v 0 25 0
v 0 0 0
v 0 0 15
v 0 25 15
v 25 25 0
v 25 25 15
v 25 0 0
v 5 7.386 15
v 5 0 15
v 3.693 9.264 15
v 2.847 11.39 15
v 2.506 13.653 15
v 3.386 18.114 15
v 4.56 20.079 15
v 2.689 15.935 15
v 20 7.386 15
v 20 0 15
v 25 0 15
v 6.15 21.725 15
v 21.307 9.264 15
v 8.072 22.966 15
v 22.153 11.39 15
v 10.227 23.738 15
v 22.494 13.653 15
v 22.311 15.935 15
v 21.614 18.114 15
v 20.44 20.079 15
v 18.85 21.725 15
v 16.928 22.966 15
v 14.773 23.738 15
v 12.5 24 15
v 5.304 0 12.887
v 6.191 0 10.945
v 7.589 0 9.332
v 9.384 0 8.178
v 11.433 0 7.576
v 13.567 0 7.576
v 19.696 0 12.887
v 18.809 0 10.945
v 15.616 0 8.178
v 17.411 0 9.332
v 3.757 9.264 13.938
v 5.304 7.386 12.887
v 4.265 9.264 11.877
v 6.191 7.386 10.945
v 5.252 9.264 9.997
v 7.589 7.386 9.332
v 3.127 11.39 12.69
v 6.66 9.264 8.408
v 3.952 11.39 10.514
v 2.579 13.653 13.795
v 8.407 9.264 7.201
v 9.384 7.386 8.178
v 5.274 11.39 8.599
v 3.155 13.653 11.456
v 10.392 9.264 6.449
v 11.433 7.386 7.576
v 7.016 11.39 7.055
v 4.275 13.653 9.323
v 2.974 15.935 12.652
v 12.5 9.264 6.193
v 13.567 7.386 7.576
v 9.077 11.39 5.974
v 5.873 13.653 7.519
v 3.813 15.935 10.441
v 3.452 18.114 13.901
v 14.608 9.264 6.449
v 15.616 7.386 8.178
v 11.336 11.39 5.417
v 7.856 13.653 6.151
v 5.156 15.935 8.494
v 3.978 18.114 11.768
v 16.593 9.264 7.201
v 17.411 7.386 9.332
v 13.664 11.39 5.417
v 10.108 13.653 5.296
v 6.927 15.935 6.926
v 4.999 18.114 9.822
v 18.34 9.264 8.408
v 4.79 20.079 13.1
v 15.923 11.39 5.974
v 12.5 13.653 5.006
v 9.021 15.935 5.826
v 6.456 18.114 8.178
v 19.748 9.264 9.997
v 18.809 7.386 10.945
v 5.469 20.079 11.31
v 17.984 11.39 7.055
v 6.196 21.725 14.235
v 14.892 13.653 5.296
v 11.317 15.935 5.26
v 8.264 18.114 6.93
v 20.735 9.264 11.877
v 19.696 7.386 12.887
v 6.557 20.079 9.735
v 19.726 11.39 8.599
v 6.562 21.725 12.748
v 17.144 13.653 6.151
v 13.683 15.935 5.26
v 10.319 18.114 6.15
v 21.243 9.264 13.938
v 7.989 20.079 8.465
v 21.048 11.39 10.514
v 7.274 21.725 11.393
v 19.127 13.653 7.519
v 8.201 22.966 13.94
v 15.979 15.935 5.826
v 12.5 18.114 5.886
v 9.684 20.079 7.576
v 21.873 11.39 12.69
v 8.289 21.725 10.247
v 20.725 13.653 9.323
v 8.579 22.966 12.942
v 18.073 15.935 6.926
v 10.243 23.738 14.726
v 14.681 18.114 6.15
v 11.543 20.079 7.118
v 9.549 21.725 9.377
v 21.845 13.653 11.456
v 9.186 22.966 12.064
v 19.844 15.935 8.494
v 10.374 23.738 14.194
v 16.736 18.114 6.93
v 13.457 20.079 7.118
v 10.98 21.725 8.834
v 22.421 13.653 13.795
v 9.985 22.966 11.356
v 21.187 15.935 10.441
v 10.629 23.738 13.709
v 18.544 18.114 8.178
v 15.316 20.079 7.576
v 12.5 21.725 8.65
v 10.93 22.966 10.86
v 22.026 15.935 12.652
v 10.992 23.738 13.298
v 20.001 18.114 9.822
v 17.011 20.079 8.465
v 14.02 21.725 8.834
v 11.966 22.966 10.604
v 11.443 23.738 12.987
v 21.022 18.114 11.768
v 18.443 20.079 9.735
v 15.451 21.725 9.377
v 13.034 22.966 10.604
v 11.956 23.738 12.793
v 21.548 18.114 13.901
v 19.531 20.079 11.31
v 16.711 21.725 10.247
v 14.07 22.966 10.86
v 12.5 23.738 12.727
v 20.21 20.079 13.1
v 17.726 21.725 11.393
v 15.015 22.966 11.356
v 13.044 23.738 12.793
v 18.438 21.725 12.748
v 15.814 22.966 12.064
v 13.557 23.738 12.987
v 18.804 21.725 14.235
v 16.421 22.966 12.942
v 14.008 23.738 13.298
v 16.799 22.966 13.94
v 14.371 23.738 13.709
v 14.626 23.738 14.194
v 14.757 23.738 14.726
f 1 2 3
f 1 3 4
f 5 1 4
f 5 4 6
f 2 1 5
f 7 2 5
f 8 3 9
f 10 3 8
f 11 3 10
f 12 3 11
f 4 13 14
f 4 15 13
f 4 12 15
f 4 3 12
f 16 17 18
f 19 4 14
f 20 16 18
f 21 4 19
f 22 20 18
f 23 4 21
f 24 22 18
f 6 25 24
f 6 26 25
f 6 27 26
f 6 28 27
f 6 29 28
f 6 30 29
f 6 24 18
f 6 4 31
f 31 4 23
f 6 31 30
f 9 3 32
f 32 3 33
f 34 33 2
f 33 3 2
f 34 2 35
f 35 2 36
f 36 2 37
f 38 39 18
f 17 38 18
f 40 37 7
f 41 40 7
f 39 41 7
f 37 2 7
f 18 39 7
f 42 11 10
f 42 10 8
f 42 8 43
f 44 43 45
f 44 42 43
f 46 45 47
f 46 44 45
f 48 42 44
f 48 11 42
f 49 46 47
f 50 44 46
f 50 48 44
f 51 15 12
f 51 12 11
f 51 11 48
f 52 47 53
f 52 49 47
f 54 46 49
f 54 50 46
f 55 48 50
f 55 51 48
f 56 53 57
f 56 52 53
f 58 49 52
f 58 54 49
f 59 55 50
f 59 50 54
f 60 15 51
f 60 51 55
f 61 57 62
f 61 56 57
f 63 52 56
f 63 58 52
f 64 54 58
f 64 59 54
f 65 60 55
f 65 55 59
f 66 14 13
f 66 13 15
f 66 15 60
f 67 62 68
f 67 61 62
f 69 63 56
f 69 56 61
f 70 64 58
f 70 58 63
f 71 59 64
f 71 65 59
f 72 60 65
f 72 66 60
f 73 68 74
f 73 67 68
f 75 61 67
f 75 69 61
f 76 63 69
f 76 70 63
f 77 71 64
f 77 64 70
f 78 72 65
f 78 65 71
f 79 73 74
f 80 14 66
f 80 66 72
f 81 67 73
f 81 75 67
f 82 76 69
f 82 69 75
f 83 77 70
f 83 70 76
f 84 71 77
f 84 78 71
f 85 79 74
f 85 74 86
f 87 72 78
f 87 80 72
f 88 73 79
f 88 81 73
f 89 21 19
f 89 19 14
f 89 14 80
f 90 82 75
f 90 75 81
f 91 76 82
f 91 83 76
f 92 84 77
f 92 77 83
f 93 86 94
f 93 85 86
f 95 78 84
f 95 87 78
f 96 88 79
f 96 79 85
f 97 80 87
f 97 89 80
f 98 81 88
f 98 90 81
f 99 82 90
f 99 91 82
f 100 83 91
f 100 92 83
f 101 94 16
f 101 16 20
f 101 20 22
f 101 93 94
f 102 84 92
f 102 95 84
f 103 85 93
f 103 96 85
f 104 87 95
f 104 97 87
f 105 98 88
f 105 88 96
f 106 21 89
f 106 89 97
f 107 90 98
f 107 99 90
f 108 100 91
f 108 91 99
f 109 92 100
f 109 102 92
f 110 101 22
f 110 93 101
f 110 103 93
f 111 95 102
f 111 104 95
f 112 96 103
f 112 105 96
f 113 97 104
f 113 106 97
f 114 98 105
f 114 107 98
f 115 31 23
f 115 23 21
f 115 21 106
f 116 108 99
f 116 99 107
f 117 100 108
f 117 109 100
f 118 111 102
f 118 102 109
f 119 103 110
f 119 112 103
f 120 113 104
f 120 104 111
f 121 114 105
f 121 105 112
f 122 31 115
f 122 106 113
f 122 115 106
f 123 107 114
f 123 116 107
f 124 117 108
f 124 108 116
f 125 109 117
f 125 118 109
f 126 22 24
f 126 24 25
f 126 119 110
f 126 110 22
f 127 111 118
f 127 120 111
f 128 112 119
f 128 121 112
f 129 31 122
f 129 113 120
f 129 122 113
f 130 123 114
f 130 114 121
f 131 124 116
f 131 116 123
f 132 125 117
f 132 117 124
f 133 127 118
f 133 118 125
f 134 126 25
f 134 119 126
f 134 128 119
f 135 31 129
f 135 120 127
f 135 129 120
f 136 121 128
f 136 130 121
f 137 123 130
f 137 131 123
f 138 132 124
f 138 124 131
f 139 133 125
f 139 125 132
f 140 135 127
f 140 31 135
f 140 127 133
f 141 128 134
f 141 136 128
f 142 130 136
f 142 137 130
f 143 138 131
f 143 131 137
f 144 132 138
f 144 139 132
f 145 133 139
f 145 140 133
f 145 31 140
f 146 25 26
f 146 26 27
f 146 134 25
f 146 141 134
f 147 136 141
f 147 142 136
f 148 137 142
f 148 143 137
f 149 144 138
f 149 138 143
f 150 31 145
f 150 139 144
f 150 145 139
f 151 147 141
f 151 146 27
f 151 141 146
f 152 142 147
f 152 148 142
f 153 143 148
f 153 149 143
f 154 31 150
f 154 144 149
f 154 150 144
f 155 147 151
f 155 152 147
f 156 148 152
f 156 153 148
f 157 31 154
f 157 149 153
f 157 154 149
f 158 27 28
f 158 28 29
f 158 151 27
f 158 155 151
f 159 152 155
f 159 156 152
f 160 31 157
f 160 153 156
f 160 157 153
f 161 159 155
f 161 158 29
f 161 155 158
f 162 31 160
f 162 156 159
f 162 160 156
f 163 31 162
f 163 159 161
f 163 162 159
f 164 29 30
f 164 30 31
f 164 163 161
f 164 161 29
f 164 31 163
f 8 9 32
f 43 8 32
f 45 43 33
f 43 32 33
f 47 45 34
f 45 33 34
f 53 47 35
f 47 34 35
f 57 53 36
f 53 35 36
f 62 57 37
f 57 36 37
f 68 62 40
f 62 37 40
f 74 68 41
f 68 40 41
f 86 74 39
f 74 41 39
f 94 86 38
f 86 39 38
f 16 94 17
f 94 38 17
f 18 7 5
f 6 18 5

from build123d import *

# Parameters (mm, degrees)
SKETCH1_W           = 25
SKETCH1_H           = 25
BOSS_EXTRUDE1_DEPTH = 15
SKETCH3_R           = 7.5
CUT_EXTRUDE1_DEPTH  = 15


with BuildPart() as part:
    # Sketch1 → Boss-Extrude1 (new body)
    with BuildSketch(Plane.XY):
        with Locations((12.5, 12.5)):
            Rectangle(SKETCH1_W, SKETCH1_H)
    extrude(amount=BOSS_EXTRUDE1_DEPTH)

    # Sketch2 → Cut-Revolve2 (revolve, cut)
    with BuildSketch(Plane.XY.offset(15)):
        with BuildLine():
            Line((12.5, 24), (12.5, 4))
            ThreePointArc((12.5, 4), (22.5, 14), (12.5, 24))
        make_face()
    revolve(axis=Axis((12.5, 24, 15), (0, -1, 0)), mode=Mode.SUBTRACT)

    # Sketch3 → Cut-Extrude1 (cut)
    with BuildSketch(Plane.XZ):
        with Locations((12.5, 15)):
            Circle(SKETCH3_R)
    extrude(amount=-CUT_EXTRUDE1_DEPTH, mode=Mode.SUBTRACT)


solid = part.part
